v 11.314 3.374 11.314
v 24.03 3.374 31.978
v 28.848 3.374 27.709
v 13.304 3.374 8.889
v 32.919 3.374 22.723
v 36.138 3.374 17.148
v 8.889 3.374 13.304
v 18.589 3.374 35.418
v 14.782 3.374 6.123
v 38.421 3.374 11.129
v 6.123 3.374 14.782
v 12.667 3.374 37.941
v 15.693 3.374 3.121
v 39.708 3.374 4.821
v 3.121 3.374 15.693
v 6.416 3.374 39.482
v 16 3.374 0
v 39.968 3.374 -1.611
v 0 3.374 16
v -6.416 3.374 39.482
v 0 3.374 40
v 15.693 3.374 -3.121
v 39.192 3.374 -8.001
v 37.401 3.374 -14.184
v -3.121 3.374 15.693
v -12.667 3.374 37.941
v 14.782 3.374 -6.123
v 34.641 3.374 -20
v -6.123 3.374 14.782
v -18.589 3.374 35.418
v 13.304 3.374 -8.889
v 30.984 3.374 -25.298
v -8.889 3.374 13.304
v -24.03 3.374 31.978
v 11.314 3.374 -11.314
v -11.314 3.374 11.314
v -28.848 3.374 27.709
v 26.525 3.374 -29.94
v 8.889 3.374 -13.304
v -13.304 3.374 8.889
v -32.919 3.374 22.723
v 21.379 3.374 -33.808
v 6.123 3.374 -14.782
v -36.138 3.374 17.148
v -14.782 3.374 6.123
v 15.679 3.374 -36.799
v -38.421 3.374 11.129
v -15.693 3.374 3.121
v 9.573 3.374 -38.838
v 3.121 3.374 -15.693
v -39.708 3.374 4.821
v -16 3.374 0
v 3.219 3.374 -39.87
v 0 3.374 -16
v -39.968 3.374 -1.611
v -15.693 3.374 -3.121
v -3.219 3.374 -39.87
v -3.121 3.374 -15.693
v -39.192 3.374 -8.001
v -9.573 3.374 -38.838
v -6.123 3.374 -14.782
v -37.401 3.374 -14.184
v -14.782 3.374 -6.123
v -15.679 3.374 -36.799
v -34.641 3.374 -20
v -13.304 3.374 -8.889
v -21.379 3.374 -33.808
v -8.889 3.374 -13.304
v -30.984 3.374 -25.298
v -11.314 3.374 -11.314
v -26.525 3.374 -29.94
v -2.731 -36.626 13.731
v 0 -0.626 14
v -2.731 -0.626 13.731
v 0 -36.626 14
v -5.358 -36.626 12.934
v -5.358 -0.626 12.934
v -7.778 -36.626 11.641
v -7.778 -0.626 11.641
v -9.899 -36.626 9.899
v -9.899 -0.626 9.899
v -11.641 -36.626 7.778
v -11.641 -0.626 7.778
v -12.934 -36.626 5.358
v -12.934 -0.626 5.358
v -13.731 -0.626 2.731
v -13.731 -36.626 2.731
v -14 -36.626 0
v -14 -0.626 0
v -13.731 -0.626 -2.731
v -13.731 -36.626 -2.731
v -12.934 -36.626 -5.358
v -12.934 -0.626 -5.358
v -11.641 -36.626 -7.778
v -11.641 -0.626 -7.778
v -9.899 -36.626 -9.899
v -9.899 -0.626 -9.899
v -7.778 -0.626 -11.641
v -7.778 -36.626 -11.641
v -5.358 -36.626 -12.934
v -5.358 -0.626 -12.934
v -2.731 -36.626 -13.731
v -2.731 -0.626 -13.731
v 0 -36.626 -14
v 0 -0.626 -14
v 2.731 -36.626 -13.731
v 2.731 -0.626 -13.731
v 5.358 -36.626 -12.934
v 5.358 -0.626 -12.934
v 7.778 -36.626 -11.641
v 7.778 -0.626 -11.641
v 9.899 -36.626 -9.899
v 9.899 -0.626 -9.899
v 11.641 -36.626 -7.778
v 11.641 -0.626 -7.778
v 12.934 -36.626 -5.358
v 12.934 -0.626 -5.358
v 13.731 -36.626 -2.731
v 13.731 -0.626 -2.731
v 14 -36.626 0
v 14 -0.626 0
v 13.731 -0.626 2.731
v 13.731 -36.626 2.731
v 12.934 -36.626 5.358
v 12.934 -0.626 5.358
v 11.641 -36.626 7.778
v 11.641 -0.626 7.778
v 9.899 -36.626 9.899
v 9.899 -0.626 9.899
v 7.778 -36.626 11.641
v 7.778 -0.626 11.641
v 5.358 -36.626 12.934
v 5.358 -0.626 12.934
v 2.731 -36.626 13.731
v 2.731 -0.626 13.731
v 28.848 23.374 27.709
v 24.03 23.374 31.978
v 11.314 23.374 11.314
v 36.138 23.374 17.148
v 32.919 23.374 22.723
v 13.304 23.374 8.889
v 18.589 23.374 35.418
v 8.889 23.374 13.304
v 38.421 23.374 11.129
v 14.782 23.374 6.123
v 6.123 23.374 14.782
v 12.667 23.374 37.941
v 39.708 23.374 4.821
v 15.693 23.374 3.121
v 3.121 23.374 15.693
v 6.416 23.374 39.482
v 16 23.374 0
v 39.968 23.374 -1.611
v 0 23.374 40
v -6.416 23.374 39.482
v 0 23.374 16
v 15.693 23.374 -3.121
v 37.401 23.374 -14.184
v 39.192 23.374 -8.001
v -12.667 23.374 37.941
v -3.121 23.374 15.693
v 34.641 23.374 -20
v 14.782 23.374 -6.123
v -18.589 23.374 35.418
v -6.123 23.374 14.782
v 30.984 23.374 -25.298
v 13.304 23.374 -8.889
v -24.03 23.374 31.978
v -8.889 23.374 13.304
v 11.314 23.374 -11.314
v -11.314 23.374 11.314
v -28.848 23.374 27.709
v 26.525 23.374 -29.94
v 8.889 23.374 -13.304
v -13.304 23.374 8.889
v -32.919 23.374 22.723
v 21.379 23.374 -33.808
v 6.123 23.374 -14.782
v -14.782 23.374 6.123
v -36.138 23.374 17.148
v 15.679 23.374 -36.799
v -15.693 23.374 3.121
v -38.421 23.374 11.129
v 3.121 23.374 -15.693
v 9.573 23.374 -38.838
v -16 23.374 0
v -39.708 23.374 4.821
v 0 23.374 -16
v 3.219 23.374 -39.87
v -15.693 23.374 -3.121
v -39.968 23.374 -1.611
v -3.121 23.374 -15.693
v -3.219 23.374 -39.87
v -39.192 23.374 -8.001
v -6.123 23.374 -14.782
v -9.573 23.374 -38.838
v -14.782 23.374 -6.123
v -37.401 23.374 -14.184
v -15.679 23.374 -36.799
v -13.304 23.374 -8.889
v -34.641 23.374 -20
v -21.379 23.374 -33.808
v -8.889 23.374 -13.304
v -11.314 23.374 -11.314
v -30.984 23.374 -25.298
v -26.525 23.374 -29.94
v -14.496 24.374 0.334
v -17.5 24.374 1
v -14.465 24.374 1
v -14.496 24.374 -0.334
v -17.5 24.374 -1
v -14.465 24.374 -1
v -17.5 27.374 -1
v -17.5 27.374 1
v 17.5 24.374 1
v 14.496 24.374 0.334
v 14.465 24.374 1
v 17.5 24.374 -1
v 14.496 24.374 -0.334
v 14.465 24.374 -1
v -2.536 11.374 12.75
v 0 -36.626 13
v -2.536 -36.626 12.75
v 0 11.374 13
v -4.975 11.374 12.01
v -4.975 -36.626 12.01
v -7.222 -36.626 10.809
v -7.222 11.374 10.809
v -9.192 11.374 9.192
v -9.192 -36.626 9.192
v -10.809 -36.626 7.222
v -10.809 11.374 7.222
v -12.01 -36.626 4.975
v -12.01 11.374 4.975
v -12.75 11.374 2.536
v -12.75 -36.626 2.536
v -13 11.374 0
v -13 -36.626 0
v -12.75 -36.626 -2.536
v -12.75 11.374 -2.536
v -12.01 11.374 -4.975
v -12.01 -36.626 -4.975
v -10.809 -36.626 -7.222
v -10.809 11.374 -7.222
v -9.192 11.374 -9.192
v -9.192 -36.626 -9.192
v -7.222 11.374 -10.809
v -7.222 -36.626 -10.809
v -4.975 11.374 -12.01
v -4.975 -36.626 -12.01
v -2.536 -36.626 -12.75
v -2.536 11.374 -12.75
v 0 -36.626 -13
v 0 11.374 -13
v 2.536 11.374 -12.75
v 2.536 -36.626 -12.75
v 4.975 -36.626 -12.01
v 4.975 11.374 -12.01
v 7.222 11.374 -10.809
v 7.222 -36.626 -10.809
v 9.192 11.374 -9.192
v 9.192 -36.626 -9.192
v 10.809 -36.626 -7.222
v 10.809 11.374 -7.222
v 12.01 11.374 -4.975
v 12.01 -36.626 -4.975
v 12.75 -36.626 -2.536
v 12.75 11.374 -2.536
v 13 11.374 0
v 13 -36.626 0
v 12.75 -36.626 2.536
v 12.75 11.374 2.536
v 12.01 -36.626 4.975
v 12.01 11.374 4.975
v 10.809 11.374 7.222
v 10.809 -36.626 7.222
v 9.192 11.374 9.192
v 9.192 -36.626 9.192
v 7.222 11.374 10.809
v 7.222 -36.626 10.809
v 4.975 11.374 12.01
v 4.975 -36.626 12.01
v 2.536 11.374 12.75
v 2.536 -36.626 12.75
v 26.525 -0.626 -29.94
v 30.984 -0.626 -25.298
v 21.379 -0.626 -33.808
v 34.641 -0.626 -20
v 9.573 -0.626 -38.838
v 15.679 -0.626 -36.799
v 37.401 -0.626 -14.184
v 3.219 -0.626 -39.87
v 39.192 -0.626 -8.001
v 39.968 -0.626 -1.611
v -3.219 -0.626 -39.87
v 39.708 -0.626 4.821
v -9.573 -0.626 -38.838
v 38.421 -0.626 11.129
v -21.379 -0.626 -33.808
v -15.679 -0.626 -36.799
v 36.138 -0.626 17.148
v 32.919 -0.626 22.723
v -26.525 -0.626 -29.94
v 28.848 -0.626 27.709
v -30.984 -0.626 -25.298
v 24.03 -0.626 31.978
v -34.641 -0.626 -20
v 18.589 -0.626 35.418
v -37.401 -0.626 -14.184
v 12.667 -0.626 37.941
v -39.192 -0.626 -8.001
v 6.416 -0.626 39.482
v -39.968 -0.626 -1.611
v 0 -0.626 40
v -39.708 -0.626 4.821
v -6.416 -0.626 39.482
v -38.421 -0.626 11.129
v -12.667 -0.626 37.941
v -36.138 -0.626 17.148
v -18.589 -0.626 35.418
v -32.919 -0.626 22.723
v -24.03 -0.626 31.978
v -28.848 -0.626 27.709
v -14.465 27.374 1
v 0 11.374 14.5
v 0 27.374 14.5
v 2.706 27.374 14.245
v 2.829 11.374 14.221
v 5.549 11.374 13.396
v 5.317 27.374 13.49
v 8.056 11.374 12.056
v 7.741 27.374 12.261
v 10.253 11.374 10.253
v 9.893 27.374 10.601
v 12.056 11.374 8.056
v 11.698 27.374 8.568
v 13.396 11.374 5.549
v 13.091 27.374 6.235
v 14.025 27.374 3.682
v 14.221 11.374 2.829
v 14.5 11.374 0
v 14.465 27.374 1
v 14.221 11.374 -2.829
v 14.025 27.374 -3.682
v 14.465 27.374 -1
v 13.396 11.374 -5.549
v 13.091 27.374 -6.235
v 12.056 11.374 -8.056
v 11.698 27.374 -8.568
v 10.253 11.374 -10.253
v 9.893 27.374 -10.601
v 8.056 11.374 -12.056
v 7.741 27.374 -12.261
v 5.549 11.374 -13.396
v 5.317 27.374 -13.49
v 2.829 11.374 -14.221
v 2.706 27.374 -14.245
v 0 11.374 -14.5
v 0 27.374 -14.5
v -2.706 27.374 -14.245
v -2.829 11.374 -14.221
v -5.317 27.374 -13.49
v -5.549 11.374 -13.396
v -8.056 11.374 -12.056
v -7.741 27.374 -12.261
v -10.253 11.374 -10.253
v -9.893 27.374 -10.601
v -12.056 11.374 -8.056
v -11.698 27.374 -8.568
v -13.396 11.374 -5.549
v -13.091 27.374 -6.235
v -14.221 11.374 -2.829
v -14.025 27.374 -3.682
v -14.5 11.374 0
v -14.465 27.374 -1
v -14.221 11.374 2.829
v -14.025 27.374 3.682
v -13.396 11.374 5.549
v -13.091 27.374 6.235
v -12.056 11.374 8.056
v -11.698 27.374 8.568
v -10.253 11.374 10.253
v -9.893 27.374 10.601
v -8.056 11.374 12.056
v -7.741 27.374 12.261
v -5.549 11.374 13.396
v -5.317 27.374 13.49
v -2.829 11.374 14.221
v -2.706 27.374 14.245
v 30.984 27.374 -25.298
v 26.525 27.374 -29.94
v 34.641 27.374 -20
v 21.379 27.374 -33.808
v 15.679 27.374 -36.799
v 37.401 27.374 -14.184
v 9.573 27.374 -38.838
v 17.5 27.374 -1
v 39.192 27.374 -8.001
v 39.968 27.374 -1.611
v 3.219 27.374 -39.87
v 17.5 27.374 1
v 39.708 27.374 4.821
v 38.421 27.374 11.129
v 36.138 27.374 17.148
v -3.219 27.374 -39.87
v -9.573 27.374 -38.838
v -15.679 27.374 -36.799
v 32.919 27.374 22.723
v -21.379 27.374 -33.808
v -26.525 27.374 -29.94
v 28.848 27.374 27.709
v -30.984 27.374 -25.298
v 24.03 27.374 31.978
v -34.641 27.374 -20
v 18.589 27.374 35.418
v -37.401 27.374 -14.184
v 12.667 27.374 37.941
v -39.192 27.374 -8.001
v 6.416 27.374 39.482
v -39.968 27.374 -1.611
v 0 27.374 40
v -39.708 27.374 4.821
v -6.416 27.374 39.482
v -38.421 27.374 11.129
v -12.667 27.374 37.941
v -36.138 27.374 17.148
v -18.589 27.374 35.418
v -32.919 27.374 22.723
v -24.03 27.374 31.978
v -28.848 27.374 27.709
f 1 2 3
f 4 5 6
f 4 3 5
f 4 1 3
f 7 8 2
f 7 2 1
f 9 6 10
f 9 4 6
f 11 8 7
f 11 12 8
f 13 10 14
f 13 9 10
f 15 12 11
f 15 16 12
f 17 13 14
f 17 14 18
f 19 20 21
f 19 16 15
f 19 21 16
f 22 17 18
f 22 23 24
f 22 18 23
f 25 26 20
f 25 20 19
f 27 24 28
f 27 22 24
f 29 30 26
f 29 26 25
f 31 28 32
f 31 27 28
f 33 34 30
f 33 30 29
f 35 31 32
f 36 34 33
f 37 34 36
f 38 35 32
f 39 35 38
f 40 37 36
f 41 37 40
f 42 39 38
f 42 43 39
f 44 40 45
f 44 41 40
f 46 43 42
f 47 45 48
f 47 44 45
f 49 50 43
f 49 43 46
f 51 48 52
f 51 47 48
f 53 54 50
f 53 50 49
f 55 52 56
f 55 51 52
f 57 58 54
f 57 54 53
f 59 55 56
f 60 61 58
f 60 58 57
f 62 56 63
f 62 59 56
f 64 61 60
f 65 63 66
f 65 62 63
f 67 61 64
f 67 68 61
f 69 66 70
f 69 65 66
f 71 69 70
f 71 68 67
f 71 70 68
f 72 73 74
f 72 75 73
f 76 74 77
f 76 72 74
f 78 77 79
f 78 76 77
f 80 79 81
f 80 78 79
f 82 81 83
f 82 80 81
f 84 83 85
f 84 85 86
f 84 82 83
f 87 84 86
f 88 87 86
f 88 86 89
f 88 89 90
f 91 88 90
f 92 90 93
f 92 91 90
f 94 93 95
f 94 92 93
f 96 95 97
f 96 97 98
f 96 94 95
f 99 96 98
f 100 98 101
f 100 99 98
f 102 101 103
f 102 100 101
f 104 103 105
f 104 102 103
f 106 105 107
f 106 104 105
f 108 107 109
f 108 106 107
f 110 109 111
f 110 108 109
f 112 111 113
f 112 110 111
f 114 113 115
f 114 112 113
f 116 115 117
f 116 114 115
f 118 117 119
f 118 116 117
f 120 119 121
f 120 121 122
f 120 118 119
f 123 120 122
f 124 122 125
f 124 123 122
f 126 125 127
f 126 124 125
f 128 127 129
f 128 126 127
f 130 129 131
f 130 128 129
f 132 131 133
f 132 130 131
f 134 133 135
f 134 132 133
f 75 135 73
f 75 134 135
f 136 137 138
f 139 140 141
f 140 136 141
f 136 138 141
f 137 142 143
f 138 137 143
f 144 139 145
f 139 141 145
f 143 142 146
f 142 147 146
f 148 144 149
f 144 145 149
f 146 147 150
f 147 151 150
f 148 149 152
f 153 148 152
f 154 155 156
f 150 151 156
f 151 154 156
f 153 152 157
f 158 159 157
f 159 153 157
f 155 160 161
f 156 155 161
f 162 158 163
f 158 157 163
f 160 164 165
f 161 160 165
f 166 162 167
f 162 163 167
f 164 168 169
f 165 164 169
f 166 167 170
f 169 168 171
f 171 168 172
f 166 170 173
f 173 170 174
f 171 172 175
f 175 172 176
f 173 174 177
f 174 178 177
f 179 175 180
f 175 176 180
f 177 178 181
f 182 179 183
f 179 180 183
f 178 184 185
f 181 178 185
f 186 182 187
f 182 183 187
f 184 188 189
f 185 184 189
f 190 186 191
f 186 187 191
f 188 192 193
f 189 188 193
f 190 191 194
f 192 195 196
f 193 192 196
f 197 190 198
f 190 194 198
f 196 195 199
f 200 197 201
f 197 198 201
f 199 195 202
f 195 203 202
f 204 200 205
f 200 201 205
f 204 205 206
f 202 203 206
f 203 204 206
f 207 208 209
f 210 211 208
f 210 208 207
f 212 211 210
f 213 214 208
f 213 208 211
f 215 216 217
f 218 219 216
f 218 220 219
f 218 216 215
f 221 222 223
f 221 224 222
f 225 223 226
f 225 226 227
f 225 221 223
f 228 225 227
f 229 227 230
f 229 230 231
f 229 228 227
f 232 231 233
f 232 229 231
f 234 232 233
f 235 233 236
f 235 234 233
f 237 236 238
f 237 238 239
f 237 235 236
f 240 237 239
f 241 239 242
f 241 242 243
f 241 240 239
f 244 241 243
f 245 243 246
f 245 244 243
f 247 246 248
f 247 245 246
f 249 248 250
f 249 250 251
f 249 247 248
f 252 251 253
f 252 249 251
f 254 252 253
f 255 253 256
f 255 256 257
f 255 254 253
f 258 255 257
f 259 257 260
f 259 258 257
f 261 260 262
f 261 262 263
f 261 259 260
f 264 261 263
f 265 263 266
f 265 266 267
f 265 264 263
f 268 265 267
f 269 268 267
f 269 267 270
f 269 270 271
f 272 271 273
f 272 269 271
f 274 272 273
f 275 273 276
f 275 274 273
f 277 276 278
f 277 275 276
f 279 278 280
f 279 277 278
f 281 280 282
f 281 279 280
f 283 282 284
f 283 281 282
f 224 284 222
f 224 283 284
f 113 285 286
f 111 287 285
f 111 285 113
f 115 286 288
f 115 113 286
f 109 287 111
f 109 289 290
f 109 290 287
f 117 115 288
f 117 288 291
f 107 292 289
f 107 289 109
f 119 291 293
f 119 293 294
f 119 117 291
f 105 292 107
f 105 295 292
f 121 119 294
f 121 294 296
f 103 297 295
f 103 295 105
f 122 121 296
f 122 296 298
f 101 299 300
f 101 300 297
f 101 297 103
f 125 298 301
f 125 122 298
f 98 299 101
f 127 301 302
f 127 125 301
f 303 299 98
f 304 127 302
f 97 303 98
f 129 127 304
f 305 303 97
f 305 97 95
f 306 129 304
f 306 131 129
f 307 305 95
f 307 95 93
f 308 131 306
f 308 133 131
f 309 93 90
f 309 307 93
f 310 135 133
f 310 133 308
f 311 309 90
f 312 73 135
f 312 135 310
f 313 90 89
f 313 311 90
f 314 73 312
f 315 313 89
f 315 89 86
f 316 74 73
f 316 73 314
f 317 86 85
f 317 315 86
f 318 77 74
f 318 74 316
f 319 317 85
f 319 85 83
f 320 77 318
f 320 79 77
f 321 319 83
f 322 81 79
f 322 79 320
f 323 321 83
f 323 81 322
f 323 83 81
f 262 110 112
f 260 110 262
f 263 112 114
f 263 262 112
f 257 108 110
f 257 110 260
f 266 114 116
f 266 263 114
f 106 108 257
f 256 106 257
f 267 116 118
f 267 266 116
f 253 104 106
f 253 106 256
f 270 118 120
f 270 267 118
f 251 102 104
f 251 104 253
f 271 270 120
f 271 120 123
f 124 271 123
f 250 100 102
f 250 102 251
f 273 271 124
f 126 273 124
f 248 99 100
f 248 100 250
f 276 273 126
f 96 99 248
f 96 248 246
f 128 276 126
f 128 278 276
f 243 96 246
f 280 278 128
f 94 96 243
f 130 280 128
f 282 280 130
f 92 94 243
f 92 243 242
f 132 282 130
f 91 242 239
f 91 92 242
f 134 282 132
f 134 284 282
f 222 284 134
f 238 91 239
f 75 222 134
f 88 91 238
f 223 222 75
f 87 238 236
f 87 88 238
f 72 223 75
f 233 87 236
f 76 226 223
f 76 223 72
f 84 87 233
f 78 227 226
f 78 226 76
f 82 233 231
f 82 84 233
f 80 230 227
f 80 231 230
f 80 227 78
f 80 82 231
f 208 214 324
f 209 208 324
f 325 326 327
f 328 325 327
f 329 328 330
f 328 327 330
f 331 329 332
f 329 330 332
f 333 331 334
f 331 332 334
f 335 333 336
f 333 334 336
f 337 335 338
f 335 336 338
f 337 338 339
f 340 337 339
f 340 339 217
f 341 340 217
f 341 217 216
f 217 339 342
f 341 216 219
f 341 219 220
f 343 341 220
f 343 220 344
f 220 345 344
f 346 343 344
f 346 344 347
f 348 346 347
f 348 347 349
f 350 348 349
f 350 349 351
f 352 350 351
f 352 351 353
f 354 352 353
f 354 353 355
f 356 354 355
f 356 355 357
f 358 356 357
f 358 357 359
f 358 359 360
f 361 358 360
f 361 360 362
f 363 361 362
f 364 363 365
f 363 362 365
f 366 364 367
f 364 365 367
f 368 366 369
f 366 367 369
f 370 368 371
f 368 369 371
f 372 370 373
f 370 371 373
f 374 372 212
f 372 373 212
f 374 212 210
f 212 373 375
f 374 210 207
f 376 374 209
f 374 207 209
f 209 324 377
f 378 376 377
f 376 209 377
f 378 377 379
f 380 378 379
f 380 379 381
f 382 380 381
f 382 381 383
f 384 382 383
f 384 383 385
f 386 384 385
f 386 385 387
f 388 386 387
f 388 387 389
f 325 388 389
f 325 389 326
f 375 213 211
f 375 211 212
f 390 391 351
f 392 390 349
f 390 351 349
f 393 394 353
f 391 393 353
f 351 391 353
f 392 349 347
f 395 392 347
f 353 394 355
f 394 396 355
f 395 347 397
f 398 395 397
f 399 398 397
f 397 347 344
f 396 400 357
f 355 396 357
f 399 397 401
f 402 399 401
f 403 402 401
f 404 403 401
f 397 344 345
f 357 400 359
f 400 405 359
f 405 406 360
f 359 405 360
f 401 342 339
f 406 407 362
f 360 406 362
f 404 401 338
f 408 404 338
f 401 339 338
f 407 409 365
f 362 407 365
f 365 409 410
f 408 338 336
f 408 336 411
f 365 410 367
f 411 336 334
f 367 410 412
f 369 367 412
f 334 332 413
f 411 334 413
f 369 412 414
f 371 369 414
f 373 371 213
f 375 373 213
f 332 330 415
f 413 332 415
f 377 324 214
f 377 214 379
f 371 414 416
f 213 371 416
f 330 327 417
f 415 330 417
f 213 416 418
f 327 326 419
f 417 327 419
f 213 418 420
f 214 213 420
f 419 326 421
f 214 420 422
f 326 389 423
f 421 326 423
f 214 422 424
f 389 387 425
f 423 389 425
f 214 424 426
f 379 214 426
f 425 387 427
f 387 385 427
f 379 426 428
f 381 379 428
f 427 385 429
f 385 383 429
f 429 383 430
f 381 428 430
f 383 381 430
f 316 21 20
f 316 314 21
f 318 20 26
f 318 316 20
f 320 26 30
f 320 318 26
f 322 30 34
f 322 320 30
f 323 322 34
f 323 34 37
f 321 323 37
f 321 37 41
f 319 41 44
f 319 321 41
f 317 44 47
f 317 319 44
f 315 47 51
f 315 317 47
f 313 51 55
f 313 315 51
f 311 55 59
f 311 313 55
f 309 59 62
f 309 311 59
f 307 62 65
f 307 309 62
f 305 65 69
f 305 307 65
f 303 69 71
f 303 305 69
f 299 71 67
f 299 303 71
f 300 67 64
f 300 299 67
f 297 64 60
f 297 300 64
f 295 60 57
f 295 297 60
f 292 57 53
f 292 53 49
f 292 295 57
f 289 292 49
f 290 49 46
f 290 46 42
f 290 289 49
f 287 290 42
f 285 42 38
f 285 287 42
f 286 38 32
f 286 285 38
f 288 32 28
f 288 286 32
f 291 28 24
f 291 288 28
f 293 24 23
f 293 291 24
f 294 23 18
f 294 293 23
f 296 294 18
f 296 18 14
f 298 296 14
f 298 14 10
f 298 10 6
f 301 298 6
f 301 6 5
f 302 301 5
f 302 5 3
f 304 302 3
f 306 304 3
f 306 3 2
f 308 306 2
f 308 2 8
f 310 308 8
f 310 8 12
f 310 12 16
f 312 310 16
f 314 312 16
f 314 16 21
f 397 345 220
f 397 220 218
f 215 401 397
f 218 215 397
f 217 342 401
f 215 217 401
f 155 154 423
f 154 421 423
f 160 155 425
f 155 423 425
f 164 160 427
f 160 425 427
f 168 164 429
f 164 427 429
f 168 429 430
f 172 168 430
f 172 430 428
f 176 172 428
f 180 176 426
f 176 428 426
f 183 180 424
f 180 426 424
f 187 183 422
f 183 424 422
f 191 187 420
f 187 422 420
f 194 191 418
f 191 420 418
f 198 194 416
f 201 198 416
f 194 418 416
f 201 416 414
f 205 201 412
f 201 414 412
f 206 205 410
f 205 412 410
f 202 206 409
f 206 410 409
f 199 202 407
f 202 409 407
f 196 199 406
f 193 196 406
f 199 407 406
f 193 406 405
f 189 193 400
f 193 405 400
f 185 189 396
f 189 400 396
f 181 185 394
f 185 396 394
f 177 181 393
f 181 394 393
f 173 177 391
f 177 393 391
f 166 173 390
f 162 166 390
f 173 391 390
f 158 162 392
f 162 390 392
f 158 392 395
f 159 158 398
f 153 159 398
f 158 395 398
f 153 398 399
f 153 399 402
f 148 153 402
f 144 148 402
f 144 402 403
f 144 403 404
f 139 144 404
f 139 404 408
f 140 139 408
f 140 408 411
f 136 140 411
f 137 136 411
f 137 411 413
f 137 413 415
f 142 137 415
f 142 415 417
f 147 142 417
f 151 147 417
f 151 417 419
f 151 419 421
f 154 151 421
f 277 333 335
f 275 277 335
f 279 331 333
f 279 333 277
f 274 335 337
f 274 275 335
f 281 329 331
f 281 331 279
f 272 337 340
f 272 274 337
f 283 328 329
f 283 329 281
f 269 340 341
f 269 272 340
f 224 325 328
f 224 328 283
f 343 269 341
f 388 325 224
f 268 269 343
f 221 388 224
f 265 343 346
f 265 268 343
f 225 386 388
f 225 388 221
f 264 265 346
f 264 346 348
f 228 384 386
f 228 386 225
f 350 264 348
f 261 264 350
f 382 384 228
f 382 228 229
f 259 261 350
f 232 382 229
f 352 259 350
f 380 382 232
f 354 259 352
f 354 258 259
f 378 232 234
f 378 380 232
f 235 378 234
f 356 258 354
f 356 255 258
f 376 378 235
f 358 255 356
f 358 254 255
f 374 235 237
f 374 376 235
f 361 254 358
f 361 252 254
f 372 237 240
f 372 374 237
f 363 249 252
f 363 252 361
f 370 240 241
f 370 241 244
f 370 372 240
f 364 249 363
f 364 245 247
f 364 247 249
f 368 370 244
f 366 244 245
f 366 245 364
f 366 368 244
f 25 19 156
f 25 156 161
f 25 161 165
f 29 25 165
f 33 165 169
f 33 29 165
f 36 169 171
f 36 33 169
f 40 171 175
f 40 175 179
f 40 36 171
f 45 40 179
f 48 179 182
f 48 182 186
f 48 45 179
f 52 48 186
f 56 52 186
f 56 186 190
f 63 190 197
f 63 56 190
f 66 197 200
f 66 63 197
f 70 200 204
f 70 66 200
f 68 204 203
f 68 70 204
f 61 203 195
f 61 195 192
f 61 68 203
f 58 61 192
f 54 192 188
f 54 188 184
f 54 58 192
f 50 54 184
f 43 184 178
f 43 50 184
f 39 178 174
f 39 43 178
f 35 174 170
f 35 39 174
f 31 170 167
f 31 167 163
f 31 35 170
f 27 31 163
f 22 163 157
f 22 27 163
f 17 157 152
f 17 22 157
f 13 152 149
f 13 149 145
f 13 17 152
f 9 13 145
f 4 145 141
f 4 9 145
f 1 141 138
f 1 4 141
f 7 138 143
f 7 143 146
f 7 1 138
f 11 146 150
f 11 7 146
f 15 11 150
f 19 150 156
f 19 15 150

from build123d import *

# Parameters (mm, degrees)
CUT_EXTRUDE1_START = 66
SKETCH2_R          = 14.5
CUT_EXTRUDE1_DEPTH = 66
SKETCH3_W          = 35
SKETCH3_H          = 2
CUT_EXTRUDE2_DEPTH = 3


with BuildPart() as part:
    # Sketch1 → Revolve1 (revolve)
    with BuildSketch(Plane(origin=(0, 0, 0), x_dir=(0, 0, -1), z_dir=(1, 0, 0))):
        Polygon((-16, 3.37389395), (-40, 3.37389395), (-40, -0.62610605), (-14.5, -0.62610605), (-14, -0.62610605), (-14, -36.62610605), (-13, -36.62610605), (-13, -0.62610605), (-13, 11.37389395), (-14.5, 11.37389395), (-14.5, 23.37389395), (-16, 23.37389395), align=None)
    revolve1 = revolve(axis=Axis((0, 28.058626224, 0), (0, -1, 0)))

    # Mirror3: Revolve1 across plane
    add(revolve1.mirror(Plane.ZX.offset(13.37389395)))

    # Sketch2 → Cut-Extrude1 (cut)
    with BuildSketch(Plane(origin=(0, 11.37389395, 0), x_dir=(1, 0, 0), z_dir=(0, 1, 0)).offset(CUT_EXTRUDE1_START)):
        with Locations(Location((0, 0, 0), (0, 0, 270))):
            Circle(SKETCH2_R)
    extrude(amount=-CUT_EXTRUDE1_DEPTH, mode=Mode.SUBTRACT)

    # Sketch3 → Cut-Extrude2 (cut)
    with BuildSketch(Plane(origin=(0, 27.37389395, 0), x_dir=(1, 0, 0), z_dir=(0, 1, 0))):
        Rectangle(SKETCH3_W, SKETCH3_H)
    extrude(amount=-CUT_EXTRUDE2_DEPTH, mode=Mode.SUBTRACT)


solid = part.part
